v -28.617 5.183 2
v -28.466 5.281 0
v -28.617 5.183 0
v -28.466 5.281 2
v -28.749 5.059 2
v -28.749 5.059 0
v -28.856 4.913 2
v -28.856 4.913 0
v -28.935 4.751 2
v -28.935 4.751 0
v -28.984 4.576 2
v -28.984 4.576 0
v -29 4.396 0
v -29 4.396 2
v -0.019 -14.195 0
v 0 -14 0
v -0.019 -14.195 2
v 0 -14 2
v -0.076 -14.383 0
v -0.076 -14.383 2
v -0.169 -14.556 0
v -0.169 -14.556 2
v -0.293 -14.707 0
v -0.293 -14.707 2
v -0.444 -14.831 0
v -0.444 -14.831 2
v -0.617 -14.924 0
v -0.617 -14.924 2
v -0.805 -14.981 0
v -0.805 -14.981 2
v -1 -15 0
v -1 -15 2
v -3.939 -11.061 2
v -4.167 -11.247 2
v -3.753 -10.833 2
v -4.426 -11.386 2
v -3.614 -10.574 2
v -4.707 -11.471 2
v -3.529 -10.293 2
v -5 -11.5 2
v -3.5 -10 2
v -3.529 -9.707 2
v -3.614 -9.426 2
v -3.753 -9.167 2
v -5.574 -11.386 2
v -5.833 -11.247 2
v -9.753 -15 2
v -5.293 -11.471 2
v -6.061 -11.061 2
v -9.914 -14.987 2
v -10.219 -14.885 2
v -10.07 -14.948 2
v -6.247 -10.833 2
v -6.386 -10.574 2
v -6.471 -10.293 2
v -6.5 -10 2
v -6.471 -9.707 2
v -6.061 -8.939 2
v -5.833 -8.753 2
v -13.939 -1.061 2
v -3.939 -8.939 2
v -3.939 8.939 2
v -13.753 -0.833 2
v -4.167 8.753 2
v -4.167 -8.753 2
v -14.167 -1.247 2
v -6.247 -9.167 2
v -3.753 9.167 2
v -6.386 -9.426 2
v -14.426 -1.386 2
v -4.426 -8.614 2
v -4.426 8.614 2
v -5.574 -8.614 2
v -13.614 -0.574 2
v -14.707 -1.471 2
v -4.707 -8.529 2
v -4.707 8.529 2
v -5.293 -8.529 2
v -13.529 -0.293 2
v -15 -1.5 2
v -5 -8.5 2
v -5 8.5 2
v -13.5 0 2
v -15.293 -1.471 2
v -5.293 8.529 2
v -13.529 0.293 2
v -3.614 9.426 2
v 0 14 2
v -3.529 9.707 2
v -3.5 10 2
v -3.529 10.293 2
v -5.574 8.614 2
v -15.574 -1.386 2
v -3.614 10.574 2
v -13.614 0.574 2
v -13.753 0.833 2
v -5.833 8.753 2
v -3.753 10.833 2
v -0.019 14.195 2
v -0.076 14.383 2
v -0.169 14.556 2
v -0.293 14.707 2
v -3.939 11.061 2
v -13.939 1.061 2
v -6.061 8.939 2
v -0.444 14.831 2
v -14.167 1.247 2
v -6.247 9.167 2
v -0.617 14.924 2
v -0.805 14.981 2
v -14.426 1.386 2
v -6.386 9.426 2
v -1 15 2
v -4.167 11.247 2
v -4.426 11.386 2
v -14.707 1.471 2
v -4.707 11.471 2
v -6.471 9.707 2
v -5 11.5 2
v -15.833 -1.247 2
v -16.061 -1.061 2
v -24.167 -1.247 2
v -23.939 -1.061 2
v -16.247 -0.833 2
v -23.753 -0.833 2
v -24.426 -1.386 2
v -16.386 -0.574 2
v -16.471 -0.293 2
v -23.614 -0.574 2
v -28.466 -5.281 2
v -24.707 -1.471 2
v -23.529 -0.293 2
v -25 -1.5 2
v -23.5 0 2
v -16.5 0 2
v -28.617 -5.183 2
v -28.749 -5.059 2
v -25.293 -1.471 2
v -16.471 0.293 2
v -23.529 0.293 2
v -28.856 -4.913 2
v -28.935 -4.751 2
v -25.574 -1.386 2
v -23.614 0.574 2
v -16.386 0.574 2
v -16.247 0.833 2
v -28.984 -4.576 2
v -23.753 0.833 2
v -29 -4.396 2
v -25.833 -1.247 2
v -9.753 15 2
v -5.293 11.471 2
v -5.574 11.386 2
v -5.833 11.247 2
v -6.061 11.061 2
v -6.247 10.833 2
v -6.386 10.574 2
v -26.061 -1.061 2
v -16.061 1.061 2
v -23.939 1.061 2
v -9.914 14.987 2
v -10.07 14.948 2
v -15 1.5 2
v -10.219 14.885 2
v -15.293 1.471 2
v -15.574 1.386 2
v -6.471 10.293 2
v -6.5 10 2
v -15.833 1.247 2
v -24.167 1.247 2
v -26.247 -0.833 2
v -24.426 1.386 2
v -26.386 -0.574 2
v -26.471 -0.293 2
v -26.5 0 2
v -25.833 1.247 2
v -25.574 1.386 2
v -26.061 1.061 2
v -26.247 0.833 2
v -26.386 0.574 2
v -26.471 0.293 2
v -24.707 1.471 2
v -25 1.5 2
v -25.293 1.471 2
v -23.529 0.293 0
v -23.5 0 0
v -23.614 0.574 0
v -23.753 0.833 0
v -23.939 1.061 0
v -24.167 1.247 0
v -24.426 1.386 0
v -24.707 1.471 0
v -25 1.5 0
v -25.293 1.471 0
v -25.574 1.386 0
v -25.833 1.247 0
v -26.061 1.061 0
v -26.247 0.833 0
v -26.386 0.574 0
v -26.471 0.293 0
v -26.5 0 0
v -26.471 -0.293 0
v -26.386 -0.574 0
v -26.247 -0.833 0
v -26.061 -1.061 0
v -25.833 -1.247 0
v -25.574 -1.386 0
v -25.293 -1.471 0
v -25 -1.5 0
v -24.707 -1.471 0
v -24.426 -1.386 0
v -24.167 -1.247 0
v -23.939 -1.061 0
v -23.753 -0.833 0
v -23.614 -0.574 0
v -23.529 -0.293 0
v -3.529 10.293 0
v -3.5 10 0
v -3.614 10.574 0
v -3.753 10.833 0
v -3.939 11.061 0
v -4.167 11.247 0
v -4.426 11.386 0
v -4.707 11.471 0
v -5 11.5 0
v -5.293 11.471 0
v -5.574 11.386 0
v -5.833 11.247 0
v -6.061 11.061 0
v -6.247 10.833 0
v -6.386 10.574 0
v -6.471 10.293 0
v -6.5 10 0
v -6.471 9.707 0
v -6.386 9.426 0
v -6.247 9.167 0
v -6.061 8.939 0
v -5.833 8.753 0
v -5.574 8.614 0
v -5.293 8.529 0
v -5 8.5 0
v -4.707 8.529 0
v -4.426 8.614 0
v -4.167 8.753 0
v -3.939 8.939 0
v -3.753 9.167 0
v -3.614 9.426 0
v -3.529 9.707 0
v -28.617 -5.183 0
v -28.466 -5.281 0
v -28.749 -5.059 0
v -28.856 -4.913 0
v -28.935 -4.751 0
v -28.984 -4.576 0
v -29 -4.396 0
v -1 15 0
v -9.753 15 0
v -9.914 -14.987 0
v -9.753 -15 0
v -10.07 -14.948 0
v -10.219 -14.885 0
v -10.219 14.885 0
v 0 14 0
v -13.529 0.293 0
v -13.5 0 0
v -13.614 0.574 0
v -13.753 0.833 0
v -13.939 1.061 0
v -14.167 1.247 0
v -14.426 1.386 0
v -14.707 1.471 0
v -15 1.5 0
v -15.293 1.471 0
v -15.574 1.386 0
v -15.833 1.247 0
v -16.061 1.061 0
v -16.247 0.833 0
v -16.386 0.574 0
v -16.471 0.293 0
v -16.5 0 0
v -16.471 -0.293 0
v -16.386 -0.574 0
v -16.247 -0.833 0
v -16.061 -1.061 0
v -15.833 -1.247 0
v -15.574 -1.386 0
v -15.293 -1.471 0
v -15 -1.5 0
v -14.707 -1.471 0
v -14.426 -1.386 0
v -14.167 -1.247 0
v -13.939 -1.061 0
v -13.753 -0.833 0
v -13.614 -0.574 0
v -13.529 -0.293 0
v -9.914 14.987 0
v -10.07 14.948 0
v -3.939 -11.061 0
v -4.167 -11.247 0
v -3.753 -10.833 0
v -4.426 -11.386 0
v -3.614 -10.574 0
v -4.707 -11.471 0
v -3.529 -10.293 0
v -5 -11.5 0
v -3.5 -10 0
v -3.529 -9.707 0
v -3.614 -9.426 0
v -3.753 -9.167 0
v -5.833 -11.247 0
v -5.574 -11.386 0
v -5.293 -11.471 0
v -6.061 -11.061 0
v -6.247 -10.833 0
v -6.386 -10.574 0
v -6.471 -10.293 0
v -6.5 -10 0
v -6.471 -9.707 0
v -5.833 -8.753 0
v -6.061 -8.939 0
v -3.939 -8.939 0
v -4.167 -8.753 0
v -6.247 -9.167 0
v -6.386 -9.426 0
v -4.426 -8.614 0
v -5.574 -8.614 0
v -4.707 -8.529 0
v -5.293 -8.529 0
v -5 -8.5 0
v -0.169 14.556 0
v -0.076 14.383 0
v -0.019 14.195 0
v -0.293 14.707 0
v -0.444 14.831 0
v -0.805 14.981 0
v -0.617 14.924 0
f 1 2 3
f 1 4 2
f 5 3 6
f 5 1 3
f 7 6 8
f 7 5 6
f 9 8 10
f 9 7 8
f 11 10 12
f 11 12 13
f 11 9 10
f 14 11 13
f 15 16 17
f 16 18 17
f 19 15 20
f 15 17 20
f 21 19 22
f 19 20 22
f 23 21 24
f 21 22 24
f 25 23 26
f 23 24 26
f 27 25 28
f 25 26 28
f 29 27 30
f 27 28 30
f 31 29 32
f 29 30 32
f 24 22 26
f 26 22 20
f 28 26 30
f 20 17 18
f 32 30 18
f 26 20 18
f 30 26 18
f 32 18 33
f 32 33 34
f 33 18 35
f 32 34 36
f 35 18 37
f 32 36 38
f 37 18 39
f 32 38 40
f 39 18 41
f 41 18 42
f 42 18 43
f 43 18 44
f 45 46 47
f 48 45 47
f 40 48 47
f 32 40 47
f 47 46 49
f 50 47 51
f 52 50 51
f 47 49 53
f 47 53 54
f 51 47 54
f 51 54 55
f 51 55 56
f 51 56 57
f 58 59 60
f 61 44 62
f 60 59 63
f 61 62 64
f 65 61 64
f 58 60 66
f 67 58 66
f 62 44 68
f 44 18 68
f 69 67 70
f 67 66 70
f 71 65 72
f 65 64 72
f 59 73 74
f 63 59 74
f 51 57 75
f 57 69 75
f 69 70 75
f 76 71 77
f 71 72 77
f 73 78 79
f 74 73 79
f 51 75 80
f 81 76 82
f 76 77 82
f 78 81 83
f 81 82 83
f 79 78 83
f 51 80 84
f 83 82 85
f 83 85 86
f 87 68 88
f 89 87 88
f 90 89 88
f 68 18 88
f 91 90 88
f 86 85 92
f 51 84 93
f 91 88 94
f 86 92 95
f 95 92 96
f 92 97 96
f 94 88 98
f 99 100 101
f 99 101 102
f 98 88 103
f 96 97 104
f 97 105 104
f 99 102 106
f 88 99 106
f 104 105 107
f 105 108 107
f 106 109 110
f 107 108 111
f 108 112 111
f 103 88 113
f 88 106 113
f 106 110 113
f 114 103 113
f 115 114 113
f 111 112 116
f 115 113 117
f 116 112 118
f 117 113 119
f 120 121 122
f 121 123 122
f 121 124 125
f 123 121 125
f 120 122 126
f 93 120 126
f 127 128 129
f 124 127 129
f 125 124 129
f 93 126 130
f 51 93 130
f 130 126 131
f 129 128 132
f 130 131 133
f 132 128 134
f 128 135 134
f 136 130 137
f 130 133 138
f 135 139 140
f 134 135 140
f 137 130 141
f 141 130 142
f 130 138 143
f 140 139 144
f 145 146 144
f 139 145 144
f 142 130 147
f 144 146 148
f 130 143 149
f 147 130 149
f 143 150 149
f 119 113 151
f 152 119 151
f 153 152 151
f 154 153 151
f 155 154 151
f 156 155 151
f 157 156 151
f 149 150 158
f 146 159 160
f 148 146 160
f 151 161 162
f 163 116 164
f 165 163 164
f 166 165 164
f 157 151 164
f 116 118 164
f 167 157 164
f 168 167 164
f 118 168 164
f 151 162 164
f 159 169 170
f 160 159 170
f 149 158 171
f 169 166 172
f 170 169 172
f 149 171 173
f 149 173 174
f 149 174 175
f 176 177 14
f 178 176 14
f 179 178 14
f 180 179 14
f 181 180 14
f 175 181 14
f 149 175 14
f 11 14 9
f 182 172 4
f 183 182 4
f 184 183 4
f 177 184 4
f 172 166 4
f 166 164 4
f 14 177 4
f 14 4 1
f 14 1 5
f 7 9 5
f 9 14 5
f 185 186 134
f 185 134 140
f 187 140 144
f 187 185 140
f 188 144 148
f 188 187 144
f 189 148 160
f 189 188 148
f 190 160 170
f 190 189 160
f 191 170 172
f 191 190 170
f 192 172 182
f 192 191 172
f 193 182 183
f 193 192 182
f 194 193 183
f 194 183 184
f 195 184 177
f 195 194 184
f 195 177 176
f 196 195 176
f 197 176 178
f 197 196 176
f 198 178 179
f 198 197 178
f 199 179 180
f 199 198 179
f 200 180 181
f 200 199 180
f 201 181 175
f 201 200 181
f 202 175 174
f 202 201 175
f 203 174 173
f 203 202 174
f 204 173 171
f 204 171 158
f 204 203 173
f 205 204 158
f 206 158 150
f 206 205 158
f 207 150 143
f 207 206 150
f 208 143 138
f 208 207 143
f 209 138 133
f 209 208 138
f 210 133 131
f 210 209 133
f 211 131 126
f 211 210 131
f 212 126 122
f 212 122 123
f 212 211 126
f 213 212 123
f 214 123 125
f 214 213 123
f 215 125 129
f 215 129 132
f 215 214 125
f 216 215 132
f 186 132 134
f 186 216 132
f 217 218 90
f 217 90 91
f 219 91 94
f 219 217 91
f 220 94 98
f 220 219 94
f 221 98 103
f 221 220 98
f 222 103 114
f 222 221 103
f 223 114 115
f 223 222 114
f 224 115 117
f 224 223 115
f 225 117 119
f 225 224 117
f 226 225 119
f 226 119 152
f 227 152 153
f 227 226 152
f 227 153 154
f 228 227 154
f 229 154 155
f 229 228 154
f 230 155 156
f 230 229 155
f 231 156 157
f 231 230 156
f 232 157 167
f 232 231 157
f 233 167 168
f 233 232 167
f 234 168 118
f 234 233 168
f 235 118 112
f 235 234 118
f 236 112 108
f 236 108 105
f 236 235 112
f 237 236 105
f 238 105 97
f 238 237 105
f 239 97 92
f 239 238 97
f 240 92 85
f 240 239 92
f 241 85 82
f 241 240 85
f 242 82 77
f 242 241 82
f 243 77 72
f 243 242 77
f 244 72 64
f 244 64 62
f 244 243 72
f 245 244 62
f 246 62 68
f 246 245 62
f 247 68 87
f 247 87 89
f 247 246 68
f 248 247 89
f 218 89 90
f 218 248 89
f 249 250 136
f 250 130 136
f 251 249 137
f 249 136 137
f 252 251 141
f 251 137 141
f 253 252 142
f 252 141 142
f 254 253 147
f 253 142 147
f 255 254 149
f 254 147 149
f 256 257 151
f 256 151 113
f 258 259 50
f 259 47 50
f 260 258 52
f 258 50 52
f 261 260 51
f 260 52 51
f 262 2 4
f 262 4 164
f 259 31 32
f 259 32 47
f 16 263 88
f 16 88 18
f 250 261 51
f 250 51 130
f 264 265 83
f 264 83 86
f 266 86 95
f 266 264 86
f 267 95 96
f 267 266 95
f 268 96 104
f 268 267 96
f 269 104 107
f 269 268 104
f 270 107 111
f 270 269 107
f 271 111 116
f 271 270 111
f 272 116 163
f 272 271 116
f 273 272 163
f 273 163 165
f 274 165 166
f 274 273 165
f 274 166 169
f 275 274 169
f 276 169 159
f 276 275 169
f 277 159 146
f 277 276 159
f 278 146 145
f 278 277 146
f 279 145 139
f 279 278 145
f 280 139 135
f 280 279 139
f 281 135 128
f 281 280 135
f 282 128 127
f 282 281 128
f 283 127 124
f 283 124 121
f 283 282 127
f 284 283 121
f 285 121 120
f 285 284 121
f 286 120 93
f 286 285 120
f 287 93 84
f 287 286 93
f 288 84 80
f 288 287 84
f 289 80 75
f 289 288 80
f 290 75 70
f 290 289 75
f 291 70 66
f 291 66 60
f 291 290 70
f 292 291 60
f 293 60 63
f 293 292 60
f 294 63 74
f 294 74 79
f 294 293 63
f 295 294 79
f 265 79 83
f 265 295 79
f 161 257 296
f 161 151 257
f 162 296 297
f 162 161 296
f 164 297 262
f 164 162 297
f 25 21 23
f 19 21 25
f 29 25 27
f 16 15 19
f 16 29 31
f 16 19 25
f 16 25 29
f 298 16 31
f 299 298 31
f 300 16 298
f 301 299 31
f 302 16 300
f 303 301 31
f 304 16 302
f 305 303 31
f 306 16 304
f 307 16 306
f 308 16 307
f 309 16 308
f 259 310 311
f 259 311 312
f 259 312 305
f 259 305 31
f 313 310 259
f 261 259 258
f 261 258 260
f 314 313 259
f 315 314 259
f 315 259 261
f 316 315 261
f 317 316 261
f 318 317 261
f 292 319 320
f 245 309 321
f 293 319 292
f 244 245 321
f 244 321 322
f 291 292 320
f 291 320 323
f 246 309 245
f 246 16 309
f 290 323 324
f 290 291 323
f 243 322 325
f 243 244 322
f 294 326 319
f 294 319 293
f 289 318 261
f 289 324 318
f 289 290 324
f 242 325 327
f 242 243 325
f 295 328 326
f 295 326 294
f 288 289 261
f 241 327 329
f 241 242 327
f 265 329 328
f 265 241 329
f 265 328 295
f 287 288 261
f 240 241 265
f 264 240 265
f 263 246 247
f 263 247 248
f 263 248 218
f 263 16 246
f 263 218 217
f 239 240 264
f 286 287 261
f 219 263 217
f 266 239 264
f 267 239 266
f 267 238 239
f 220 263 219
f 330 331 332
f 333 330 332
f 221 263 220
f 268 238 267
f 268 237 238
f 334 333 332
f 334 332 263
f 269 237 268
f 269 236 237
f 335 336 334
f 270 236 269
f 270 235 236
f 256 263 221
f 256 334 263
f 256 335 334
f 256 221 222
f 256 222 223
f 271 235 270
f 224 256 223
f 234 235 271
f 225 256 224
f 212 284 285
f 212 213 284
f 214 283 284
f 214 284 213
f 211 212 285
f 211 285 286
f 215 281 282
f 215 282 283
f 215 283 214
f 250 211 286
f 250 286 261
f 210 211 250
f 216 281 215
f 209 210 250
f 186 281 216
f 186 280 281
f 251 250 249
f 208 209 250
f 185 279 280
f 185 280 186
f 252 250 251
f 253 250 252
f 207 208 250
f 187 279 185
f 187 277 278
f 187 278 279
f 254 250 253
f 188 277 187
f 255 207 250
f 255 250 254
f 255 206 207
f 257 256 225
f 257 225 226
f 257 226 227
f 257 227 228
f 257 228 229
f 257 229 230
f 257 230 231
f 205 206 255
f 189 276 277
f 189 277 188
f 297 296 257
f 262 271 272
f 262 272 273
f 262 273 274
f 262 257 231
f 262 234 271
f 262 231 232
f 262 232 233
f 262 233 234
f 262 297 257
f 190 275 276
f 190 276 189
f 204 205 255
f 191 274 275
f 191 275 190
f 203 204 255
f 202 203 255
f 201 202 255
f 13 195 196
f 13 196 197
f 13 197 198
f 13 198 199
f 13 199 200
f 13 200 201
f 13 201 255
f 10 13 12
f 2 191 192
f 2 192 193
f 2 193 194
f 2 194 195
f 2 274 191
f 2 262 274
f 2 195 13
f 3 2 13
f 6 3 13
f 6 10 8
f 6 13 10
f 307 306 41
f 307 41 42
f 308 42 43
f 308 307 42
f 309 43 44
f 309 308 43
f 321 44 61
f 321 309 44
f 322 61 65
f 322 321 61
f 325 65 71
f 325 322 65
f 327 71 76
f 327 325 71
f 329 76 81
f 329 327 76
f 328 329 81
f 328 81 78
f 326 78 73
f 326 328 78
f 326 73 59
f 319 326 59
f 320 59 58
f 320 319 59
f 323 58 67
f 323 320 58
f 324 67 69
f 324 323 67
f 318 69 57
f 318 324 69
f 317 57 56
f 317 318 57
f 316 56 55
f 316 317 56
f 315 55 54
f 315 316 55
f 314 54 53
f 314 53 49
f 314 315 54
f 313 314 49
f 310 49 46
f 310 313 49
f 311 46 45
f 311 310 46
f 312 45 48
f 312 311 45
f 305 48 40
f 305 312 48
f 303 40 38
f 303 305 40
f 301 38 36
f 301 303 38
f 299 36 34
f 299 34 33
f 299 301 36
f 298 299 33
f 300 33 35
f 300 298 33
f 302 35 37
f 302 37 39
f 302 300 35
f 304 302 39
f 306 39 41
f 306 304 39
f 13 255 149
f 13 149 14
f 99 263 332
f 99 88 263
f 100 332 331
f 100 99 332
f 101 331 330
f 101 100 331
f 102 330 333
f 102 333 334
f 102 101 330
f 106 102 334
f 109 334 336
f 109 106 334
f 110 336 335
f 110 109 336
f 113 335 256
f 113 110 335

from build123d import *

# Parameters (mm, degrees)
SKETCH_1_R      = 1.5
EXTRUDE_1_DEPTH = 2
FILLET_1_R      = 1


with BuildPart() as part:
    # 草图1 → 凸台-拉伸1 (new body)
    with BuildSketch(Plane.XY):
        Polygon((0, 15), (0, -15), (-10, -15), (-29, -5), (-29, 5), (-10, 15), align=None)
        with Locations((-15, 0)):
            Circle(SKETCH_1_R, mode=Mode.SUBTRACT)
        with Locations((-5, -10)):
            Circle(SKETCH_1_R, mode=Mode.SUBTRACT)
        with Locations((-5, 10)):
            Circle(SKETCH_1_R, mode=Mode.SUBTRACT)
        with Locations((-25, 0)):
            Circle(SKETCH_1_R, mode=Mode.SUBTRACT)
    extrude(amount=EXTRUDE_1_DEPTH)

    # 圆角1
    fillet_1_edges = [part.edges().sort_by_distance(p)[0] for p in [
        (0, 15, 1),
        (0, -15, 1),
        (-10, -15, 1),
        (-29, -5, 1),
        (-29, 5, 1),
        (-10, 15, 1),
    ]]
    fillet(fillet_1_edges, radius=FILLET_1_R)


solid = part.part
